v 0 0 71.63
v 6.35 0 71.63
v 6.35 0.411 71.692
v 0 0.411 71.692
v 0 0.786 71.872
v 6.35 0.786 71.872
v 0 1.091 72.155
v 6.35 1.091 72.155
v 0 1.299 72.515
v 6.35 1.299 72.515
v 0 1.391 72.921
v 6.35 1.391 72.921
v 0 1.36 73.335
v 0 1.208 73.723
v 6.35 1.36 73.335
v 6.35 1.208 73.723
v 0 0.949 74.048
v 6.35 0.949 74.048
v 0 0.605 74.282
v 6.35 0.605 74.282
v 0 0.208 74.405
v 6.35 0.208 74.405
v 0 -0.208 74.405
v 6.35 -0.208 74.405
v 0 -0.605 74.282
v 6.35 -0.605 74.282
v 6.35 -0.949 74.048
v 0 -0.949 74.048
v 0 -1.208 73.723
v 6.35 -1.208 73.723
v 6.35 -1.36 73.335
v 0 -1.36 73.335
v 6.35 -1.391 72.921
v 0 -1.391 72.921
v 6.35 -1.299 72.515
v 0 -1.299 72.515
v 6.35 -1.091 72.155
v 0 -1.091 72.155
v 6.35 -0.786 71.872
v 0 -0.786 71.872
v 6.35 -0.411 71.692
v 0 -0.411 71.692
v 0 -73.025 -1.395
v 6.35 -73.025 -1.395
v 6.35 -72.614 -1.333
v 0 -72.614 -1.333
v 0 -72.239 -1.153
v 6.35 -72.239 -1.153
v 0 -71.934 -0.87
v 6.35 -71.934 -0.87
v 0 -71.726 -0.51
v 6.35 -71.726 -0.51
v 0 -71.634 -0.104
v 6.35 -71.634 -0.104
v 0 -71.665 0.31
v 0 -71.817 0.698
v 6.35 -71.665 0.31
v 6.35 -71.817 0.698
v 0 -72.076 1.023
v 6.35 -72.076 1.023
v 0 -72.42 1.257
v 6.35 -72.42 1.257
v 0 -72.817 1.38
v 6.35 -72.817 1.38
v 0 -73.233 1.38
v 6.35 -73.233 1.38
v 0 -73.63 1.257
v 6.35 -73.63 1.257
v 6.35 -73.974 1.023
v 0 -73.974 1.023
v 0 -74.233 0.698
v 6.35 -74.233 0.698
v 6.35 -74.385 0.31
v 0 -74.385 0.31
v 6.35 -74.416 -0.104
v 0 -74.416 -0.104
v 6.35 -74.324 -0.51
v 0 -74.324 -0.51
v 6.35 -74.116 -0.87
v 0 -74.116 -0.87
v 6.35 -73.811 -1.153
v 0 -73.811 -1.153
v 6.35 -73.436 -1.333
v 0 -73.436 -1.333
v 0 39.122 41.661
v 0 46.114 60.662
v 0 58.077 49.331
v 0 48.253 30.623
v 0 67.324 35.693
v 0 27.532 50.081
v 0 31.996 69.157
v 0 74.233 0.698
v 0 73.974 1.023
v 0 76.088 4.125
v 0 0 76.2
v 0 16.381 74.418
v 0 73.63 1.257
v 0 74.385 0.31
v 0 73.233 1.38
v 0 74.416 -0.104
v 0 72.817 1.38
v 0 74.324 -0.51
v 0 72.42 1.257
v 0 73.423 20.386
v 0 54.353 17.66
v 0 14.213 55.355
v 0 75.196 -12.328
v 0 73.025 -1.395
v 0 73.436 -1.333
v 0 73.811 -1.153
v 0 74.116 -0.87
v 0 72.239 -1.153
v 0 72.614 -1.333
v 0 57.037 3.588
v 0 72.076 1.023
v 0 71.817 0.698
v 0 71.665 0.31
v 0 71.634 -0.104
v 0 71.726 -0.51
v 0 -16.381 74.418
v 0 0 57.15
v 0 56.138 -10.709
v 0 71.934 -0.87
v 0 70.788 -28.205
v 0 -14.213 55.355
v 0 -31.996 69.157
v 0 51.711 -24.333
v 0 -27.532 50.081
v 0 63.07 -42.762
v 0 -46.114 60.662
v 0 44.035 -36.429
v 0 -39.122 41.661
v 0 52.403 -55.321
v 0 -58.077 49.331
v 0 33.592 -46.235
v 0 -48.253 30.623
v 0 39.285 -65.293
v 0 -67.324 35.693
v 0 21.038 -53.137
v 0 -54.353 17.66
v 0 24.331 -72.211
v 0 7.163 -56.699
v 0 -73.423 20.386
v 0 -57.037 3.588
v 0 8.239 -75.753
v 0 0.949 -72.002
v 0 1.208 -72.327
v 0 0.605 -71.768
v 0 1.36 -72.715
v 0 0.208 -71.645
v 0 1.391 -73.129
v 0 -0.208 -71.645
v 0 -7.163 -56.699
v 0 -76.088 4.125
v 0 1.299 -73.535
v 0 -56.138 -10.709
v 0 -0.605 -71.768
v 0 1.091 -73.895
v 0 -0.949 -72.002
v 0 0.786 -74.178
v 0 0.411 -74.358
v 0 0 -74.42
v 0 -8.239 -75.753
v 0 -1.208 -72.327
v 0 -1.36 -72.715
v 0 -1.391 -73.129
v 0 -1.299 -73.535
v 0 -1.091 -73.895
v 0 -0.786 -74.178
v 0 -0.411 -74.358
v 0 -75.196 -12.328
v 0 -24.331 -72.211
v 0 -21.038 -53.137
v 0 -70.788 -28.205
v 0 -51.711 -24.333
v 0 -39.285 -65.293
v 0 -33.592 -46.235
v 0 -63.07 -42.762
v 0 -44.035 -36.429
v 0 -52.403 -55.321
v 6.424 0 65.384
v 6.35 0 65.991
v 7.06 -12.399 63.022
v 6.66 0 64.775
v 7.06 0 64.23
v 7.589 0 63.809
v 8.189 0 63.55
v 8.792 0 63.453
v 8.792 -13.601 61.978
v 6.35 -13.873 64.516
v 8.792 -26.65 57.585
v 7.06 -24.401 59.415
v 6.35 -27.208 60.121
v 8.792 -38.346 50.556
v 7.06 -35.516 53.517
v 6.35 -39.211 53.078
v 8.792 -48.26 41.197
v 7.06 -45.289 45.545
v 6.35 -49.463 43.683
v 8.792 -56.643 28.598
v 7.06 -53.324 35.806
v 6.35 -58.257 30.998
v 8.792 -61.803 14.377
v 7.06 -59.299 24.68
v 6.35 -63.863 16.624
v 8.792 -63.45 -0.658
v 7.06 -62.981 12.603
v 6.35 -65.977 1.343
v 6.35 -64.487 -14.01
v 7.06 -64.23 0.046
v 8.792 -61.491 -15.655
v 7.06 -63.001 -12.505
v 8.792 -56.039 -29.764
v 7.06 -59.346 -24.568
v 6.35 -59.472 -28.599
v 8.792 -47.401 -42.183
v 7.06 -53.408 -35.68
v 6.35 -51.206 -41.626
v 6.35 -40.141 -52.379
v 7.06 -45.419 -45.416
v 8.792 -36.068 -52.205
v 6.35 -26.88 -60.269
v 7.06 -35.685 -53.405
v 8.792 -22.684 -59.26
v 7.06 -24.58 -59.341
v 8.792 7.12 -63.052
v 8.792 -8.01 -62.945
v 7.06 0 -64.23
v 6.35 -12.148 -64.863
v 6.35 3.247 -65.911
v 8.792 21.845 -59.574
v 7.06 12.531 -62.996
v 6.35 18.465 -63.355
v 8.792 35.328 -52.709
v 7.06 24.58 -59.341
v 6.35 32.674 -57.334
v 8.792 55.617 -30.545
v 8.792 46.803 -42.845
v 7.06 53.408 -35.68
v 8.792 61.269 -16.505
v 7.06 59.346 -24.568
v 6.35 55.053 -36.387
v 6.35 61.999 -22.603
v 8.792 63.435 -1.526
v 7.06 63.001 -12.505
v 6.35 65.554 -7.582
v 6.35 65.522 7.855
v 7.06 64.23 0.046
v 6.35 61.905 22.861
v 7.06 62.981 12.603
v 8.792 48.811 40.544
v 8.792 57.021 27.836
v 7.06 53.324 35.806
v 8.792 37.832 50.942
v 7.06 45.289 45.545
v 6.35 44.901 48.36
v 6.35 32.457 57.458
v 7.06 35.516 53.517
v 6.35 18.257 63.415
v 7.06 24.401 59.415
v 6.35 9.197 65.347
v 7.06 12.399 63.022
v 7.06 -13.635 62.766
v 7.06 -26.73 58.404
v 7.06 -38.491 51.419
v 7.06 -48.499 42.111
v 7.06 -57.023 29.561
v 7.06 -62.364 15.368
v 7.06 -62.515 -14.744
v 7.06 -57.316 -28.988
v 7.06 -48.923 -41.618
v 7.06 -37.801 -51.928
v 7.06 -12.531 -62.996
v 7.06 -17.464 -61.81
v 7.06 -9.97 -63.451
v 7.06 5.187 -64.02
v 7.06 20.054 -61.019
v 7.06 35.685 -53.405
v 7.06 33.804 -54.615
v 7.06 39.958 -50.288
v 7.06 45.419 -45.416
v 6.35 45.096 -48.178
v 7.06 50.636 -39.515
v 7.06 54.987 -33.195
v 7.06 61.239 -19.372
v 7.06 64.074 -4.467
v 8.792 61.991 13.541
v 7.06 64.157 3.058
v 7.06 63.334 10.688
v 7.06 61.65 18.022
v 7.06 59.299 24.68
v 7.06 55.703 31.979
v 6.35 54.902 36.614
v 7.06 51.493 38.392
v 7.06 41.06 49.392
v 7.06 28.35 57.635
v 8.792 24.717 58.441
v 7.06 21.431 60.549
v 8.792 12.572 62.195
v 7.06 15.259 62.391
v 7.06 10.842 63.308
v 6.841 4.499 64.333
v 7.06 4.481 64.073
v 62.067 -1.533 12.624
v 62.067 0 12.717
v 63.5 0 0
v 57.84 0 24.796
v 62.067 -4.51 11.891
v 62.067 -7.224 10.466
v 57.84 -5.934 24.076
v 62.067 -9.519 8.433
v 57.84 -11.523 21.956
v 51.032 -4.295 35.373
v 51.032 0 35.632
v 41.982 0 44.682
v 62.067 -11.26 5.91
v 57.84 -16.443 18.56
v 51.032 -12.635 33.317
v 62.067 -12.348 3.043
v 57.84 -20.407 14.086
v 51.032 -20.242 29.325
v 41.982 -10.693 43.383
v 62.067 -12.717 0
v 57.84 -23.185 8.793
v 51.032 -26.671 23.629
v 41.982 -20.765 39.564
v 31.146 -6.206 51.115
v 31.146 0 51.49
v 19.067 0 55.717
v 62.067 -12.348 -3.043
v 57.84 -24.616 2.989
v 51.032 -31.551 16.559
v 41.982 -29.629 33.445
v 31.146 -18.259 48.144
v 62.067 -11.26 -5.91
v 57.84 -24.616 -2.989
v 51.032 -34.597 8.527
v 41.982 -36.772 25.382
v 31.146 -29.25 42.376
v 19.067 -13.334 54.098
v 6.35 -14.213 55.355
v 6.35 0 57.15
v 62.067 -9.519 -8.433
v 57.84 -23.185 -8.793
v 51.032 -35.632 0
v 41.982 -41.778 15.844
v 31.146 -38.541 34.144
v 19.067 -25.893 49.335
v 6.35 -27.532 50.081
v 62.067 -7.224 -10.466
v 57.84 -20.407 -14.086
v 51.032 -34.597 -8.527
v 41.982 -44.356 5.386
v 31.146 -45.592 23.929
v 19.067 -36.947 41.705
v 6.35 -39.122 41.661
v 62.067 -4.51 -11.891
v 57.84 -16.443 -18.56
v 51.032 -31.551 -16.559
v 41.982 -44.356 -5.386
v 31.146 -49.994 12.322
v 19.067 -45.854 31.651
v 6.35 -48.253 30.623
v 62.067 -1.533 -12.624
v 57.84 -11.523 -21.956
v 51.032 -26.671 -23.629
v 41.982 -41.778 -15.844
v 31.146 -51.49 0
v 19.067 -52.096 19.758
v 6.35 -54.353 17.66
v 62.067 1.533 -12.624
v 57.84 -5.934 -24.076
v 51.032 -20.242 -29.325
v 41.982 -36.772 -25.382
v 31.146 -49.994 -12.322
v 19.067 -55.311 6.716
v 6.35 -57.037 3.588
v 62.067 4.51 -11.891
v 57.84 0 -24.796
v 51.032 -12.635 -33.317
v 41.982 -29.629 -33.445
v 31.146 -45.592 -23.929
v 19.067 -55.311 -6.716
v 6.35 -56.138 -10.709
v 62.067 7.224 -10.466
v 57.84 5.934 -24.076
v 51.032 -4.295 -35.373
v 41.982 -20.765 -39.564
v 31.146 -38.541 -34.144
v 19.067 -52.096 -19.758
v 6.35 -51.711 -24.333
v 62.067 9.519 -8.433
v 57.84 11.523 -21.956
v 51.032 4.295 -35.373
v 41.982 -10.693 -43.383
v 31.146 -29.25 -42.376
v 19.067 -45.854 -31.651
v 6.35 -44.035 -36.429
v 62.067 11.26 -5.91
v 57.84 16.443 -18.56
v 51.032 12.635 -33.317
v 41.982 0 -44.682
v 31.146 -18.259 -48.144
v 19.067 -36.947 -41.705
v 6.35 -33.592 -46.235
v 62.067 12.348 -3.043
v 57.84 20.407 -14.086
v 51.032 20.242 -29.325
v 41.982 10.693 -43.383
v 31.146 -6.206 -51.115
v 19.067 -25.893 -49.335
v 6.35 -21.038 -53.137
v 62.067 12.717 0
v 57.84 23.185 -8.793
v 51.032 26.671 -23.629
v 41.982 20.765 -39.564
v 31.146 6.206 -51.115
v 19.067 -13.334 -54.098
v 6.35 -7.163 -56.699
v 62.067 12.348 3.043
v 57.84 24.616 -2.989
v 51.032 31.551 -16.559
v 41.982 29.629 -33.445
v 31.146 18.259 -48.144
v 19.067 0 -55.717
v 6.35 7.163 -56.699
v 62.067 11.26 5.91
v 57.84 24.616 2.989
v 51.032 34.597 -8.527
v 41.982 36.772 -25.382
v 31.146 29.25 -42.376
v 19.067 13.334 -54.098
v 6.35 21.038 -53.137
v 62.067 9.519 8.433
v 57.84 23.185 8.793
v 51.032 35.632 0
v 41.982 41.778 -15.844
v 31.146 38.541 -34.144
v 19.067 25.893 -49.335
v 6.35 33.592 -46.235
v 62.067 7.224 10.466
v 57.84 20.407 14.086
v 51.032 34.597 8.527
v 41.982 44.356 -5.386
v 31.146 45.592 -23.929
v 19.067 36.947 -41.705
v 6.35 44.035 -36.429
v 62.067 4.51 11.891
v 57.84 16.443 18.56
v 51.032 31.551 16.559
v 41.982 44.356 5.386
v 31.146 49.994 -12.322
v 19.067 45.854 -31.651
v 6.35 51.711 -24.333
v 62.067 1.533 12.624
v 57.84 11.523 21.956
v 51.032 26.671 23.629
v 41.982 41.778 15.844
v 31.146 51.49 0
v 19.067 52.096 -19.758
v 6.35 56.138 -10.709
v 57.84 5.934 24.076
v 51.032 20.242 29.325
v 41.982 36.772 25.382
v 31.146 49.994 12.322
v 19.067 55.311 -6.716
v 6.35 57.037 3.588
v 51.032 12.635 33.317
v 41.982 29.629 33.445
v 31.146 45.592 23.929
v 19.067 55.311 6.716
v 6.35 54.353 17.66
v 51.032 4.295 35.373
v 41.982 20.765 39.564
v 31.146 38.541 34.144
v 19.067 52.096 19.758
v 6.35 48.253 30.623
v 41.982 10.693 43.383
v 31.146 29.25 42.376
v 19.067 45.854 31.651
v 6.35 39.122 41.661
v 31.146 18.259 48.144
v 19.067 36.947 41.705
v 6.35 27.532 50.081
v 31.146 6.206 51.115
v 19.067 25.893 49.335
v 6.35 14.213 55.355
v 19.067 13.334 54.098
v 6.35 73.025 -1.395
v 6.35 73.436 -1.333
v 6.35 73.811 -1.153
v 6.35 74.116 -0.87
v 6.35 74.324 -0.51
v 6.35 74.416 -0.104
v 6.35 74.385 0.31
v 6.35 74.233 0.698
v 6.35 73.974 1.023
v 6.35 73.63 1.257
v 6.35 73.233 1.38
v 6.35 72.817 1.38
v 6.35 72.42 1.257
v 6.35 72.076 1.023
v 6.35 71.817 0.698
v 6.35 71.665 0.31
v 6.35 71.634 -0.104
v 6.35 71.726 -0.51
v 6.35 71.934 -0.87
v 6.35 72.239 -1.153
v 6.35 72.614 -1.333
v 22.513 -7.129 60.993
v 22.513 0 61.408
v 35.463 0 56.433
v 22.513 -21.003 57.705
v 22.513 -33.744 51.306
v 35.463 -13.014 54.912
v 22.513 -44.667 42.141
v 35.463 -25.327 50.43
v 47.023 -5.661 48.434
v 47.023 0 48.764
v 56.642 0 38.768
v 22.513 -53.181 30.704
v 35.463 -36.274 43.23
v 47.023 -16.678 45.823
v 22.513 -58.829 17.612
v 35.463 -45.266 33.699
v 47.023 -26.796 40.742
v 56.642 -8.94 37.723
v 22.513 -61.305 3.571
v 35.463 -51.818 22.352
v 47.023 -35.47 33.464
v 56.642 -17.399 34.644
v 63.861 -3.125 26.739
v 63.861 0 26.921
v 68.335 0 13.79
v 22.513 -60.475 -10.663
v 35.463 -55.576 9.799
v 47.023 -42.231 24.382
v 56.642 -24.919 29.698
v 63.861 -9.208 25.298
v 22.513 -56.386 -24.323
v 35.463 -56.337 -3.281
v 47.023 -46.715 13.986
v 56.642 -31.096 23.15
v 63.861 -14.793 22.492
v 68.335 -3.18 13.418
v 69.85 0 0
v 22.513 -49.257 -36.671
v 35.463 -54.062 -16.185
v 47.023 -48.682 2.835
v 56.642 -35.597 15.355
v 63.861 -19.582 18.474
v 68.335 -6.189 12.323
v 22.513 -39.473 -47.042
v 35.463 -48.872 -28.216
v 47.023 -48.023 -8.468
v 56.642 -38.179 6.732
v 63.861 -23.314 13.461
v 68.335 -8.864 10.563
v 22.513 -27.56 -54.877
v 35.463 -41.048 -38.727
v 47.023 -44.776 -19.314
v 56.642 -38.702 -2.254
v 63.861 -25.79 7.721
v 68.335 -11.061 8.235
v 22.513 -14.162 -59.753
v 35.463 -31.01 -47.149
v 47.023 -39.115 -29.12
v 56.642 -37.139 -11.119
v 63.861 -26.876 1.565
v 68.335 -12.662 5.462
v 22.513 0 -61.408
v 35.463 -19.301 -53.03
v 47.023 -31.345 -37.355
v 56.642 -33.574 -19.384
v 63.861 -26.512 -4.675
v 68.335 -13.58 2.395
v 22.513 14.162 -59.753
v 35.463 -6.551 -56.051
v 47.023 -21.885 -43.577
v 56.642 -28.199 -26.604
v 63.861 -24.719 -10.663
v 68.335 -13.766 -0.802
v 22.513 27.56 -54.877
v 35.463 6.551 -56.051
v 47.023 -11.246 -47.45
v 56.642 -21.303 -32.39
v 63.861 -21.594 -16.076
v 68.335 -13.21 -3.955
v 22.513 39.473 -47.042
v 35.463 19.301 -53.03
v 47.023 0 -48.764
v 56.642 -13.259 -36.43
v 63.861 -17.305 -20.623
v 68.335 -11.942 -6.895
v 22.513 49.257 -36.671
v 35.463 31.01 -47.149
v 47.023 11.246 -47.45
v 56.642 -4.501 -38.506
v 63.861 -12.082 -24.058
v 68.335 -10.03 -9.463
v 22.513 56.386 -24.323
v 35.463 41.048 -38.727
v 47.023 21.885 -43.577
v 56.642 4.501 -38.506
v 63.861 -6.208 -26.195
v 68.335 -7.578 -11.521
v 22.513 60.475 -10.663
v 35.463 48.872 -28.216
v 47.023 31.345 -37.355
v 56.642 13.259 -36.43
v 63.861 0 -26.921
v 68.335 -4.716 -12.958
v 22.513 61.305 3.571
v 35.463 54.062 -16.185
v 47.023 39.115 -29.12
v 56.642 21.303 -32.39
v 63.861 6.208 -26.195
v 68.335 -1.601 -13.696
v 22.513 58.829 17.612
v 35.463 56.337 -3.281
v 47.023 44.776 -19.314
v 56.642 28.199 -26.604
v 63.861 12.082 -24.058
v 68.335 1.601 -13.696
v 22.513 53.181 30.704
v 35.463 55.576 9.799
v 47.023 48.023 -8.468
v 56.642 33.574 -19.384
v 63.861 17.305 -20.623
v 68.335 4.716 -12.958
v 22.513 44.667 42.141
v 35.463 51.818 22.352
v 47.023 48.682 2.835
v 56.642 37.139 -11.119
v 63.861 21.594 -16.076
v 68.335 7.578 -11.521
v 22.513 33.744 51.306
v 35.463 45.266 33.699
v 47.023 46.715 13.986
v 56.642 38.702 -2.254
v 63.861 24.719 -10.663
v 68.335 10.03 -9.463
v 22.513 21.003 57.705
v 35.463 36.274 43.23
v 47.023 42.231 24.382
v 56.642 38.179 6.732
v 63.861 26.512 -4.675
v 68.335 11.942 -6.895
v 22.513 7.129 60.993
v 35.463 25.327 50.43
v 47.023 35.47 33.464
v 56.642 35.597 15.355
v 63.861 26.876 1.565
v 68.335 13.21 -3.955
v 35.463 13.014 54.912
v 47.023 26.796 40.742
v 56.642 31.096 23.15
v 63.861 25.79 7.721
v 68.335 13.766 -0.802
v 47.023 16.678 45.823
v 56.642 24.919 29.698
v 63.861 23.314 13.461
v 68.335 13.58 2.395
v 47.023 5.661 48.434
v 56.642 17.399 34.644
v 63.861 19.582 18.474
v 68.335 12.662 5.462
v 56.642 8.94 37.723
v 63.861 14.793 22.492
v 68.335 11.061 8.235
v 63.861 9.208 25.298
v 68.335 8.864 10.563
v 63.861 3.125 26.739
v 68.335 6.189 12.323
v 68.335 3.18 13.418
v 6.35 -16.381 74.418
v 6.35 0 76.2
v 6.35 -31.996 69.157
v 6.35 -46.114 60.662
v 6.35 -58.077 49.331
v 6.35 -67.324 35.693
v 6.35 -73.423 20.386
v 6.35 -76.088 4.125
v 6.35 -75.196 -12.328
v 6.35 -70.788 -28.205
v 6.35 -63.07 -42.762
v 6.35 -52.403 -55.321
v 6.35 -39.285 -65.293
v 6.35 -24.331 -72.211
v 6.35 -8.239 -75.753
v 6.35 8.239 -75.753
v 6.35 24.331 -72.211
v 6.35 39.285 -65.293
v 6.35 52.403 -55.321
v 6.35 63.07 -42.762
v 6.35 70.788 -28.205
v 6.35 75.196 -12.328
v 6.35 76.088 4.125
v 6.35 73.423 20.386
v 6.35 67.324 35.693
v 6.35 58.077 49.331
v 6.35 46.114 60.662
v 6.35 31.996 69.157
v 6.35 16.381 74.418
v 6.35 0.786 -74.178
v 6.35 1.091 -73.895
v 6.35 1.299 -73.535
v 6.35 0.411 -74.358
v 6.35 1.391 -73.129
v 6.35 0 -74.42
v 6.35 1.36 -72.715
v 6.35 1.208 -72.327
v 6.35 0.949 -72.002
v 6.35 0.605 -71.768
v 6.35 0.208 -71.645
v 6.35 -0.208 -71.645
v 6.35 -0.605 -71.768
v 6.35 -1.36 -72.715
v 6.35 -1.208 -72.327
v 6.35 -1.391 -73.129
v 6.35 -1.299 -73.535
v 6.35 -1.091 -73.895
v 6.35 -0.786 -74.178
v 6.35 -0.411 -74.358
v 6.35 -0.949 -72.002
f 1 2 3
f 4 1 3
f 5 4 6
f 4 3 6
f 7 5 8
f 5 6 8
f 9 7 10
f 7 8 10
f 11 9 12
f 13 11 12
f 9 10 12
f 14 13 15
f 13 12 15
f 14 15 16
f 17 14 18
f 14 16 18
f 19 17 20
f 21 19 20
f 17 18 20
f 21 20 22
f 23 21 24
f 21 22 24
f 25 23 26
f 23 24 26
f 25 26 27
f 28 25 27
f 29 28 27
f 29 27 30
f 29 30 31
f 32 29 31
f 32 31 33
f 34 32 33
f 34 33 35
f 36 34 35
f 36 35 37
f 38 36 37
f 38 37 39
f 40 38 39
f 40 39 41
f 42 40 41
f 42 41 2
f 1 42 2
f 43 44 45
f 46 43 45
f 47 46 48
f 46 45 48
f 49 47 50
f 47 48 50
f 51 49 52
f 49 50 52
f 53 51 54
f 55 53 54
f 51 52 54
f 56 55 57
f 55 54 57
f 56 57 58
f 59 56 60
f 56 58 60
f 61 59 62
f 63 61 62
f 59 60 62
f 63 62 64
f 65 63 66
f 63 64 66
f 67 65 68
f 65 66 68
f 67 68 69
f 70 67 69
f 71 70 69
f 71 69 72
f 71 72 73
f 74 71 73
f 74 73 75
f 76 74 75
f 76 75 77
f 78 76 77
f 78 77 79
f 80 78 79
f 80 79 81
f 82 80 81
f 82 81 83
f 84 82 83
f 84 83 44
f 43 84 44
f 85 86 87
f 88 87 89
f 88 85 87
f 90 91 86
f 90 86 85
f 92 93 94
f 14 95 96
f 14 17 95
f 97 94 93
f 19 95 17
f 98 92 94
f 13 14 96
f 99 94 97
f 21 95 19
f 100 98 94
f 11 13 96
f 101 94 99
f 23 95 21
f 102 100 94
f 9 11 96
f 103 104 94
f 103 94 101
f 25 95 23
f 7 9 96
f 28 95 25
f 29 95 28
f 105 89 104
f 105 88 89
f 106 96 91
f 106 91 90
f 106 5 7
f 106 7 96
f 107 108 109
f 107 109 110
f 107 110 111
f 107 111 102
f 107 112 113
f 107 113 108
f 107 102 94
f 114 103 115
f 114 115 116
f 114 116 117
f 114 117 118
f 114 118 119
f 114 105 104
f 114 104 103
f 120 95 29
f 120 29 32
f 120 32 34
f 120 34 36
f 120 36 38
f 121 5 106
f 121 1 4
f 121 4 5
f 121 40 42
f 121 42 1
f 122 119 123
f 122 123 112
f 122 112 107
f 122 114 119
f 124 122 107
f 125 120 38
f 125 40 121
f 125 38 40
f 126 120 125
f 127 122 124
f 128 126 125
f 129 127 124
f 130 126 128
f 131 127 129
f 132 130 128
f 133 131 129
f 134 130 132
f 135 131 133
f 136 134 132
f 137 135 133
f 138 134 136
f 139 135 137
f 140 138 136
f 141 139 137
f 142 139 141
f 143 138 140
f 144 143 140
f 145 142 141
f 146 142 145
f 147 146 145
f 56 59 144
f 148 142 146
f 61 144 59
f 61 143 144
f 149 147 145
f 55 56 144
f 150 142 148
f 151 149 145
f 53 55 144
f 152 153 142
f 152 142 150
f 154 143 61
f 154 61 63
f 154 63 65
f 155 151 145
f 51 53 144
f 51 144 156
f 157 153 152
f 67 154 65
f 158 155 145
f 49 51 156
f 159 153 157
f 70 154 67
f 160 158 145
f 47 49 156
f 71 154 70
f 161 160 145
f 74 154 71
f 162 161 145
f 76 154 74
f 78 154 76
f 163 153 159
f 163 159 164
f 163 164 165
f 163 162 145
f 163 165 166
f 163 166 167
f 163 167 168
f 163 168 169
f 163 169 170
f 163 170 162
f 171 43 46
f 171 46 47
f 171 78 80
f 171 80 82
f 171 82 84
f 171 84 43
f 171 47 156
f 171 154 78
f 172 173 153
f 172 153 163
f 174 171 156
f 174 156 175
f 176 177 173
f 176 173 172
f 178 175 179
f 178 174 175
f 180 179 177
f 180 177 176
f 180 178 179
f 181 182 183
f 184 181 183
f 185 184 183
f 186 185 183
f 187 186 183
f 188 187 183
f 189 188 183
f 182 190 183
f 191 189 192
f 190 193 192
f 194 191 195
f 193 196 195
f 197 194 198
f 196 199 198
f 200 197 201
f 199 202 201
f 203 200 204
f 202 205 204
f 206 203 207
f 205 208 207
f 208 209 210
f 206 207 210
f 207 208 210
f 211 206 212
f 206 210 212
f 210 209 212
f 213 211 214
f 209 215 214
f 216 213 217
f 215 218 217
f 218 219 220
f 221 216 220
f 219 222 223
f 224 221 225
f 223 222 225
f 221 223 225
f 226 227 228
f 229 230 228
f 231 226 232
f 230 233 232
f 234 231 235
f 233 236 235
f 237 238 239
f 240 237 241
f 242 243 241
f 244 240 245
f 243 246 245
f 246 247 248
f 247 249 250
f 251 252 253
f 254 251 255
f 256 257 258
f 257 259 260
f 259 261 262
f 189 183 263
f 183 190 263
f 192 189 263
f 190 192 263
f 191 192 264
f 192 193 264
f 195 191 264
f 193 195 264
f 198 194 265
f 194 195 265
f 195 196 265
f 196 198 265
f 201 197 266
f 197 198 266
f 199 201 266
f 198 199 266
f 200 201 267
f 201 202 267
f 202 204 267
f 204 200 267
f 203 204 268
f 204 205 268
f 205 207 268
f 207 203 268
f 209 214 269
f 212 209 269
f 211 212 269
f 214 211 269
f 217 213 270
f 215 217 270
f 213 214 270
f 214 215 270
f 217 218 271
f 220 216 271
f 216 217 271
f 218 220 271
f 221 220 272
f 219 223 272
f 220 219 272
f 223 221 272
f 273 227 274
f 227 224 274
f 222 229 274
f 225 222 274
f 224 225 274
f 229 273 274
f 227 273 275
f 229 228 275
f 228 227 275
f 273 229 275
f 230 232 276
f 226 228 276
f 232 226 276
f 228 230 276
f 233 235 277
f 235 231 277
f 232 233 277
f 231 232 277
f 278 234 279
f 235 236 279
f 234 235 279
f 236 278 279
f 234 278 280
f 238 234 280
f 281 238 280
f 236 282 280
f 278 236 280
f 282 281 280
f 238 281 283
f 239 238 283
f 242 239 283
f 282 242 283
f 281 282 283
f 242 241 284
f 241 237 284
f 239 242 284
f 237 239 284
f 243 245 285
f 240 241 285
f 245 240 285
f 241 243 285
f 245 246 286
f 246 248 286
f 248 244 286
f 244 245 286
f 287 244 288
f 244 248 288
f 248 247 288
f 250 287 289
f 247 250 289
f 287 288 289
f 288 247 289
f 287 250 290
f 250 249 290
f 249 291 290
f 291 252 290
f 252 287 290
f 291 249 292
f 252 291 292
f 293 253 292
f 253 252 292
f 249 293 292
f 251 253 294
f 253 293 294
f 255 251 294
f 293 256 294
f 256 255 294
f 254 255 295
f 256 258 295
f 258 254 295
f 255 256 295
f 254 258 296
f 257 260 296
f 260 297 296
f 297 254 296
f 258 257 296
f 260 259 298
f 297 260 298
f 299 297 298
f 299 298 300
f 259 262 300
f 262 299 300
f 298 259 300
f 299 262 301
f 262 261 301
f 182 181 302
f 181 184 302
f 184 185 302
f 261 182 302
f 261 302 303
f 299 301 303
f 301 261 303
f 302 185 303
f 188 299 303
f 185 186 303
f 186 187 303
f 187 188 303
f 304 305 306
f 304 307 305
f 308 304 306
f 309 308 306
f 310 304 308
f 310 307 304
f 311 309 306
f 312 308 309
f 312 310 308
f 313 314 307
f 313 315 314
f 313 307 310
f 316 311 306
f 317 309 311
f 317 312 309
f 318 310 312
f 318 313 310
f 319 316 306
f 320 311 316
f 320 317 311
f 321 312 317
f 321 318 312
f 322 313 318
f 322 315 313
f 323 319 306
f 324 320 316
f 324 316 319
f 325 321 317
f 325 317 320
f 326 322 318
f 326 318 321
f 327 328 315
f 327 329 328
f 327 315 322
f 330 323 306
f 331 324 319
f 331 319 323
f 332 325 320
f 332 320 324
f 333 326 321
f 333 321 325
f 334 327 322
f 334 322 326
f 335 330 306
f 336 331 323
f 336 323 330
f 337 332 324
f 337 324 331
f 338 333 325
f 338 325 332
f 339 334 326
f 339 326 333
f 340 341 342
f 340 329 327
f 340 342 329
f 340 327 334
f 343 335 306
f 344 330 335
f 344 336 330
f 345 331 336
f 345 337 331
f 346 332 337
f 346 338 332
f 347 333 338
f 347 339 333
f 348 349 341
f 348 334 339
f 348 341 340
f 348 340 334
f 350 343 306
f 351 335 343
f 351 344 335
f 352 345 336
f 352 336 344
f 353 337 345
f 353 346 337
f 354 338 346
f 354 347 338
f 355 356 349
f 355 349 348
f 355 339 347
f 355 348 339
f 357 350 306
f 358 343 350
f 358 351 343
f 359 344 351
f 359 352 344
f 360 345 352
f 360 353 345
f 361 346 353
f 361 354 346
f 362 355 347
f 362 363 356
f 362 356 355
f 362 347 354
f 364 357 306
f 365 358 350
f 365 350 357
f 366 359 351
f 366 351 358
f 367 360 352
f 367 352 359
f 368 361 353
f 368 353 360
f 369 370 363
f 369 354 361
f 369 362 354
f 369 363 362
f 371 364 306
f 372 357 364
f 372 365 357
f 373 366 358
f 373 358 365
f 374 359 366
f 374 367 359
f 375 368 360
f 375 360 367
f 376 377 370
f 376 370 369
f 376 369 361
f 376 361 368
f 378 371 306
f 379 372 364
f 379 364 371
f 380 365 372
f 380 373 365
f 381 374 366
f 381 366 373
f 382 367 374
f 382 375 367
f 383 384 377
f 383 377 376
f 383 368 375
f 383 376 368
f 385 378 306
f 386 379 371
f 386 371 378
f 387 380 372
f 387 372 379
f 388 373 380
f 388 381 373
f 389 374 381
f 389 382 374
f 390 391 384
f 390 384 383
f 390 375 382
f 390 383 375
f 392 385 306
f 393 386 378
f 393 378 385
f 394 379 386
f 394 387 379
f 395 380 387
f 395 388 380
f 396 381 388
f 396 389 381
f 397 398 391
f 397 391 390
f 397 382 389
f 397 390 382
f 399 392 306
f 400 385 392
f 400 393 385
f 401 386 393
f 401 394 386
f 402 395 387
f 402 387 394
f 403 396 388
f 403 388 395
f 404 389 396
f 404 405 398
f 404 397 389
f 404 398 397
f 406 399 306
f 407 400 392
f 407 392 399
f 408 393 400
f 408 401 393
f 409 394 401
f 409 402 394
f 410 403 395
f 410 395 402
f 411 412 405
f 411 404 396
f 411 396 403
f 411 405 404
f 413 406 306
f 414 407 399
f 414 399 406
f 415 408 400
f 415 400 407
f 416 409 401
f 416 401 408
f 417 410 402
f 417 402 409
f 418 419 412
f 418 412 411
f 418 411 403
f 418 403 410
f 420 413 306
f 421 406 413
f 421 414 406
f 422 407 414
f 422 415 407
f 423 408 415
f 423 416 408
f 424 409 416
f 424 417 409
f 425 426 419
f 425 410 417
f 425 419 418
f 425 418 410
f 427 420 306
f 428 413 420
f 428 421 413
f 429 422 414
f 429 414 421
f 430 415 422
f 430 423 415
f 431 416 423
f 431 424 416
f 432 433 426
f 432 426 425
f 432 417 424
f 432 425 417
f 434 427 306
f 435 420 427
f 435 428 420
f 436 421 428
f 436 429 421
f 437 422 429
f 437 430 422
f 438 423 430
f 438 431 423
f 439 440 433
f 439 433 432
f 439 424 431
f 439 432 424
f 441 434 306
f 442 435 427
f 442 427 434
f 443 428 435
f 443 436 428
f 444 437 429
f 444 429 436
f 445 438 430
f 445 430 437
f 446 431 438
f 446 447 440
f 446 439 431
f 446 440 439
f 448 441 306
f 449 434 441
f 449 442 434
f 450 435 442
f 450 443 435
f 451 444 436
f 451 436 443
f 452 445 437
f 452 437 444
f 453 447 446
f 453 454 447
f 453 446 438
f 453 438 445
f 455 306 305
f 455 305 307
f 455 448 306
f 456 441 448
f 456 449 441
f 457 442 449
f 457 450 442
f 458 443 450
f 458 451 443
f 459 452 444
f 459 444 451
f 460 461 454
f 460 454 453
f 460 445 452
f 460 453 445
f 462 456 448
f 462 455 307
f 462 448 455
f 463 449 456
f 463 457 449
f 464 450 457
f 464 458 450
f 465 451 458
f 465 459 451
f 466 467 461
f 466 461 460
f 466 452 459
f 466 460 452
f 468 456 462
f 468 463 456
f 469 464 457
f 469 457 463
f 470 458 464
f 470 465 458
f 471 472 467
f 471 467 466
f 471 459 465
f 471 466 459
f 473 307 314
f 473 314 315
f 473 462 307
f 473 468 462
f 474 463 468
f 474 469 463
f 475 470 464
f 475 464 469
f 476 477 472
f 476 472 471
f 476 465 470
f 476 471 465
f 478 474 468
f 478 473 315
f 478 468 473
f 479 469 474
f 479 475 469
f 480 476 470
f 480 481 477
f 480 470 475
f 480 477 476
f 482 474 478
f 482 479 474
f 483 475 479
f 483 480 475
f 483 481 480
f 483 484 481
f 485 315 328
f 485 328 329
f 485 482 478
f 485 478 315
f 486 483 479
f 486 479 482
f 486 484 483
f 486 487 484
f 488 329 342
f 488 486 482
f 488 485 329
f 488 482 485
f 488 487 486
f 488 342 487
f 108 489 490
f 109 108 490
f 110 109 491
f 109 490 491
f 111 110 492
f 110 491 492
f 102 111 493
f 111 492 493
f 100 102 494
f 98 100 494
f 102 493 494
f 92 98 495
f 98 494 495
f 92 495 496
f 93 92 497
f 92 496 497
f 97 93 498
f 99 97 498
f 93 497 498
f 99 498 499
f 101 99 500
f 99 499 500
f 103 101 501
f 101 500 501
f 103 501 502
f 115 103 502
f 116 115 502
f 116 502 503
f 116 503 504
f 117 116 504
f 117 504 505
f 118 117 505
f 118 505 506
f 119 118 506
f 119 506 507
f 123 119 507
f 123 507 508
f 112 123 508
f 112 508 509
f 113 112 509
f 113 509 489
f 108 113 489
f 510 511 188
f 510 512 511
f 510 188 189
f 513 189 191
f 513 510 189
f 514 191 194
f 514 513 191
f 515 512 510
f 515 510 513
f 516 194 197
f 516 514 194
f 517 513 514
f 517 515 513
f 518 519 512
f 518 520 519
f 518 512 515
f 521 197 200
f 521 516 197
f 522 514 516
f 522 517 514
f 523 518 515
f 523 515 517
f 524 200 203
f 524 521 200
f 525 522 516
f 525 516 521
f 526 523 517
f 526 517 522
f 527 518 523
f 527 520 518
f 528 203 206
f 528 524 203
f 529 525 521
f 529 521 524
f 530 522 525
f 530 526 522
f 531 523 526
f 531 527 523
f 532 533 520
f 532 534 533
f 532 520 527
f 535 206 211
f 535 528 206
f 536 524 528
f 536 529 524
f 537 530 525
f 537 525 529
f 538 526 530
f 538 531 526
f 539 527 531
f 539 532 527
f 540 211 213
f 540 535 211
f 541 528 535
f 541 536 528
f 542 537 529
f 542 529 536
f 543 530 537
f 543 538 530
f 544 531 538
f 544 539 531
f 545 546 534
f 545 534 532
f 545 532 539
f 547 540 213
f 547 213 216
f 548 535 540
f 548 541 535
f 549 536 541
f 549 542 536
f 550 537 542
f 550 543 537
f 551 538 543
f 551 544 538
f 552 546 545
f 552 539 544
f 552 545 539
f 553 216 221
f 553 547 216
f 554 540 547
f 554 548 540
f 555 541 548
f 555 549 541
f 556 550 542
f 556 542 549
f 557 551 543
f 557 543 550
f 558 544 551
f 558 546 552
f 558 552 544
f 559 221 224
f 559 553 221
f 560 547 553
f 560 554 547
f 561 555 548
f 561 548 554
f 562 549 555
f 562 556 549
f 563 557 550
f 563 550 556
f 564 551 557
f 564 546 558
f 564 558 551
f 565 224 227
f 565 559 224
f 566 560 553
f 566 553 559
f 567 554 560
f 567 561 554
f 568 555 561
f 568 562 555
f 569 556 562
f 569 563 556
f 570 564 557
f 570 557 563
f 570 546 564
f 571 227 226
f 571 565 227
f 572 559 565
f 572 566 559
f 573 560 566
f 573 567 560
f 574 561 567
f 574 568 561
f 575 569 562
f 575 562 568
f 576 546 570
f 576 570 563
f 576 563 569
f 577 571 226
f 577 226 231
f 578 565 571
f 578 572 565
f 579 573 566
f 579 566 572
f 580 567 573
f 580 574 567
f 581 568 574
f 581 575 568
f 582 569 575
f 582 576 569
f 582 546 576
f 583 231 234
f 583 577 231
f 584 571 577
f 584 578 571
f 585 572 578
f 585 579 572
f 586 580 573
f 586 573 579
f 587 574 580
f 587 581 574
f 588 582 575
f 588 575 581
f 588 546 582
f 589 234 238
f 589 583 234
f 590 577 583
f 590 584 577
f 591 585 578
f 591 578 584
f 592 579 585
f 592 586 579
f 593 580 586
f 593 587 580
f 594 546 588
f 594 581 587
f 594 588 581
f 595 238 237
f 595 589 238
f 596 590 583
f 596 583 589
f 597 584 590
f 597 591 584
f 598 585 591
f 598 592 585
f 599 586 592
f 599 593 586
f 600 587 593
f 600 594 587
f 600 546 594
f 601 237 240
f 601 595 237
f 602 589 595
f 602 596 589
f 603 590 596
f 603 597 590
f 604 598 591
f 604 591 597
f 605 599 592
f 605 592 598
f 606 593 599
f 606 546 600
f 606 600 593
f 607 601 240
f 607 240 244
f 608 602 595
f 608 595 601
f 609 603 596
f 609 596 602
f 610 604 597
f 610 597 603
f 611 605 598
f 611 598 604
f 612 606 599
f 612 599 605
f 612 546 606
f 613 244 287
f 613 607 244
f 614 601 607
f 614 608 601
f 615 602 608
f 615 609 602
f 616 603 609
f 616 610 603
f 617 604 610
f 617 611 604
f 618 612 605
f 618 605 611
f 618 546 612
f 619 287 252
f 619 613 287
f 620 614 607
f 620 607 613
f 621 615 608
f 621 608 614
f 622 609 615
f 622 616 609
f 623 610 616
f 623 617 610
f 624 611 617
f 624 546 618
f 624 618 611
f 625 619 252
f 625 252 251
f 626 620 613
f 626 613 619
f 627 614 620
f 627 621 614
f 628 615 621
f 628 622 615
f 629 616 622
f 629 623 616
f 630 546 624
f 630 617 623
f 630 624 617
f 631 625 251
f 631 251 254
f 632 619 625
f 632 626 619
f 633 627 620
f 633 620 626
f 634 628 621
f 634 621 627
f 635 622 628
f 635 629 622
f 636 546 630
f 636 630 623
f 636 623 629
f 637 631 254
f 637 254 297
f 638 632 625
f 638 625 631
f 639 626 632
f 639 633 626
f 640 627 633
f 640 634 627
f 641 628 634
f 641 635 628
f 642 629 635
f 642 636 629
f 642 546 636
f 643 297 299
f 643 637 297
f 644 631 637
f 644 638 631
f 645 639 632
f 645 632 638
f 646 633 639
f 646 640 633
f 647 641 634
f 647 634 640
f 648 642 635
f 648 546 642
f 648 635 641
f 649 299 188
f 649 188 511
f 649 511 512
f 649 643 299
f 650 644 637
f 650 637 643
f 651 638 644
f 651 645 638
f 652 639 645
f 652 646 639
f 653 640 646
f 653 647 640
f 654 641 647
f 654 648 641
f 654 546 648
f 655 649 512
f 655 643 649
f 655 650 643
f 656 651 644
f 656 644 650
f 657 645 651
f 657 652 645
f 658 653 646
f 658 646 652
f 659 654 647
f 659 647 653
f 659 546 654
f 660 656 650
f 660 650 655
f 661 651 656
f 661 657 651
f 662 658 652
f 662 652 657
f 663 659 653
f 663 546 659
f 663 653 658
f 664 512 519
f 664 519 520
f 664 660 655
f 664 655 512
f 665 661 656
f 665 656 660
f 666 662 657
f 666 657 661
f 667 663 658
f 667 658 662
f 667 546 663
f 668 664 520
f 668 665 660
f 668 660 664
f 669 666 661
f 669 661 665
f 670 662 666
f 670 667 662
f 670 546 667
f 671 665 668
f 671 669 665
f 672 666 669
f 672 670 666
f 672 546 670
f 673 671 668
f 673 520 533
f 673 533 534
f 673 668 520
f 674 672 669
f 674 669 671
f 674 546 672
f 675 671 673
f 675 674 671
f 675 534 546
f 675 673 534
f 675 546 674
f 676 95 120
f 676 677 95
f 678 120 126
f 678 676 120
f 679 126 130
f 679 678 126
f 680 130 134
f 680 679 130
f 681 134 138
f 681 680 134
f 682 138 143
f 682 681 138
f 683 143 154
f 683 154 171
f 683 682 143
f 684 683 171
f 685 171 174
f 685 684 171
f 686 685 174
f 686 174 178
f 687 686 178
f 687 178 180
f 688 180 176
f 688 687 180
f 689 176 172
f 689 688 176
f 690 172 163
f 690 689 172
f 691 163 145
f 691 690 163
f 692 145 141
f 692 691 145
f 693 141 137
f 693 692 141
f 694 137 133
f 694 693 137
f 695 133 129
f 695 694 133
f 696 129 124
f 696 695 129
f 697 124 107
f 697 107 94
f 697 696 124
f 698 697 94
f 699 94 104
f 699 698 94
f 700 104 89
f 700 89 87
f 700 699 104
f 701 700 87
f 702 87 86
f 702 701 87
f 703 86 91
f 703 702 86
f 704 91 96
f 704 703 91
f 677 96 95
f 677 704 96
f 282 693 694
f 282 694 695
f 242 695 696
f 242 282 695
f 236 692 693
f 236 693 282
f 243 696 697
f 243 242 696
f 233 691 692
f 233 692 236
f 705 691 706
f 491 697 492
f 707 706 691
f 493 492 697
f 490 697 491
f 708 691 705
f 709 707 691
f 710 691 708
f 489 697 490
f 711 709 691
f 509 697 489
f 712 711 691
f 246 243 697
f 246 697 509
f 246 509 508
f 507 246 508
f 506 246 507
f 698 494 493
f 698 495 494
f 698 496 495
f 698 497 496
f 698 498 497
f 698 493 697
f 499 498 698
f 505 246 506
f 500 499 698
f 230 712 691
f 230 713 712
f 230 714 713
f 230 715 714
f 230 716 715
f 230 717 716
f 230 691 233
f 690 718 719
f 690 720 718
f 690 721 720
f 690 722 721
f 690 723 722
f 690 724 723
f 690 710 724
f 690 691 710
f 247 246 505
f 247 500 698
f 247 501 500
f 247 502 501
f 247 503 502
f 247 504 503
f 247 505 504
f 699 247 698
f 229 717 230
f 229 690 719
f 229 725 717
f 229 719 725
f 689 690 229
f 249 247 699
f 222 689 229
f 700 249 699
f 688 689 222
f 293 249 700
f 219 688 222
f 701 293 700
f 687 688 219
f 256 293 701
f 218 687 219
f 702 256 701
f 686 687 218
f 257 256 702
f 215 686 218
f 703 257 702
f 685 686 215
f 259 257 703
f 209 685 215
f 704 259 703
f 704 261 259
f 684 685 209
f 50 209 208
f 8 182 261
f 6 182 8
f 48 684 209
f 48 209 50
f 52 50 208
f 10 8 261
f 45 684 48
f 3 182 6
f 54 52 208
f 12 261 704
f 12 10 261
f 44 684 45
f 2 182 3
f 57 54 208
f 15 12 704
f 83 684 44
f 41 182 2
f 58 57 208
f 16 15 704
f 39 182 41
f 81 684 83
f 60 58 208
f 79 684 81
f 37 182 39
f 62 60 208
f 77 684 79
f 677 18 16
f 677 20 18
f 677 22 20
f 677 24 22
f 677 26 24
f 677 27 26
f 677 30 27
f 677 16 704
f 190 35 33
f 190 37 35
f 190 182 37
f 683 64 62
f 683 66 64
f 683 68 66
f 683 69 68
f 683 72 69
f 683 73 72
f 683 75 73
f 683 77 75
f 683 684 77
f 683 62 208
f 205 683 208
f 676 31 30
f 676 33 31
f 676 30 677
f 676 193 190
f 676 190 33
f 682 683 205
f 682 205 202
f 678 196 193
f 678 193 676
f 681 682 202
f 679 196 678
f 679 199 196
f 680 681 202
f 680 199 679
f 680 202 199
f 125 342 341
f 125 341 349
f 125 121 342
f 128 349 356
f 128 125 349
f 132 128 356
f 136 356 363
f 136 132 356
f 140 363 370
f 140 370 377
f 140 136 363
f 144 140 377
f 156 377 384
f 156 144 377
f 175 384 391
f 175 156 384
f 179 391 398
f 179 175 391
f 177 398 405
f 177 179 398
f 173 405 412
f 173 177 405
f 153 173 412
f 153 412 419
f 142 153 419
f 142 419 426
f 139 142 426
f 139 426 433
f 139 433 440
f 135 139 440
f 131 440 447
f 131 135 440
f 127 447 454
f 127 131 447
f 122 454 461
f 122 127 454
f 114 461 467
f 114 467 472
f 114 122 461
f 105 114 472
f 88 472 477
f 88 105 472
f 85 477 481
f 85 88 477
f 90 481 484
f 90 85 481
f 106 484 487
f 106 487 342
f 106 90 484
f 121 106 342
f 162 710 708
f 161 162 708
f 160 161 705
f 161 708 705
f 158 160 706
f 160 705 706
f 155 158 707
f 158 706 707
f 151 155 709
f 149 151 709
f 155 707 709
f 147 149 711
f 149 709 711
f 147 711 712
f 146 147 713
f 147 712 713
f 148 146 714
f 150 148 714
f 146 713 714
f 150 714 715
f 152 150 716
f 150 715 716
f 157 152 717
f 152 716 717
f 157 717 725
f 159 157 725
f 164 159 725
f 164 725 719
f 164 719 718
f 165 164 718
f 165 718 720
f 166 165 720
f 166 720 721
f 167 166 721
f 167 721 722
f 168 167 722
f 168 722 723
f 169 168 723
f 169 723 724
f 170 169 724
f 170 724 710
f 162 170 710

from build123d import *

# Parameters (mm, degrees)
FILLET1_R          = 2.54
SKETCH2_R          = 1.395150395
CUT_EXTRUDE1_DEPTH = 126.080494205


with BuildPart() as part:
    # Sketch1 → Revolve1 (revolve)
    with BuildSketch(Plane.XY, mode=Mode.PRIVATE) as revolve1_sk:
        with BuildLine():
            Line((0, 76.2), (6.35, 76.2))
            Line((6.35, 76.2), (6.35, 63.5))
            ThreePointArc((6.35, 63.5), (51.251280605, 44.901280605), (69.85, 0))
            Line((69.85, 0), (63.5, 0))
            ThreePointArc((63.5, 0), (46.761152545, 40.411152545), (6.35, 57.15))
            Line((6.35, 57.15), (0, 57.15))
            Line((0, 57.15), (0, 76.2))
        make_face()
    revolve(revolve1_sk.sketch.rotate(Axis((0, 0, 0), (1, 0, 0)), 90), axis=Axis((0, 0, 0), (1, 0, 0)))

    # Fillet1
    fillet1_edges = [part.edges().sort_by_distance(p)[0] for p in [
        (6.35, 0, -63.5),
    ]]
    fillet(fillet1_edges, radius=FILLET1_R)

    # Sketch2 → Cut-Extrude1 (cut, through all)
    with BuildSketch(Plane(origin=(6.35, 0, 0), x_dir=(0, 0, -1), z_dir=(1, 0, 0))):
        with Locations((0, 73.025)):
            Circle(SKETCH2_R)
        with Locations((73.025, 0)):
            Circle(SKETCH2_R)
        with Locations((0, -73.025)):
            Circle(SKETCH2_R)
        with Locations((-73.025, 0)):
            Circle(SKETCH2_R)
    extrude(amount=-CUT_EXTRUDE1_DEPTH, mode=Mode.SUBTRACT)


solid = part.part
